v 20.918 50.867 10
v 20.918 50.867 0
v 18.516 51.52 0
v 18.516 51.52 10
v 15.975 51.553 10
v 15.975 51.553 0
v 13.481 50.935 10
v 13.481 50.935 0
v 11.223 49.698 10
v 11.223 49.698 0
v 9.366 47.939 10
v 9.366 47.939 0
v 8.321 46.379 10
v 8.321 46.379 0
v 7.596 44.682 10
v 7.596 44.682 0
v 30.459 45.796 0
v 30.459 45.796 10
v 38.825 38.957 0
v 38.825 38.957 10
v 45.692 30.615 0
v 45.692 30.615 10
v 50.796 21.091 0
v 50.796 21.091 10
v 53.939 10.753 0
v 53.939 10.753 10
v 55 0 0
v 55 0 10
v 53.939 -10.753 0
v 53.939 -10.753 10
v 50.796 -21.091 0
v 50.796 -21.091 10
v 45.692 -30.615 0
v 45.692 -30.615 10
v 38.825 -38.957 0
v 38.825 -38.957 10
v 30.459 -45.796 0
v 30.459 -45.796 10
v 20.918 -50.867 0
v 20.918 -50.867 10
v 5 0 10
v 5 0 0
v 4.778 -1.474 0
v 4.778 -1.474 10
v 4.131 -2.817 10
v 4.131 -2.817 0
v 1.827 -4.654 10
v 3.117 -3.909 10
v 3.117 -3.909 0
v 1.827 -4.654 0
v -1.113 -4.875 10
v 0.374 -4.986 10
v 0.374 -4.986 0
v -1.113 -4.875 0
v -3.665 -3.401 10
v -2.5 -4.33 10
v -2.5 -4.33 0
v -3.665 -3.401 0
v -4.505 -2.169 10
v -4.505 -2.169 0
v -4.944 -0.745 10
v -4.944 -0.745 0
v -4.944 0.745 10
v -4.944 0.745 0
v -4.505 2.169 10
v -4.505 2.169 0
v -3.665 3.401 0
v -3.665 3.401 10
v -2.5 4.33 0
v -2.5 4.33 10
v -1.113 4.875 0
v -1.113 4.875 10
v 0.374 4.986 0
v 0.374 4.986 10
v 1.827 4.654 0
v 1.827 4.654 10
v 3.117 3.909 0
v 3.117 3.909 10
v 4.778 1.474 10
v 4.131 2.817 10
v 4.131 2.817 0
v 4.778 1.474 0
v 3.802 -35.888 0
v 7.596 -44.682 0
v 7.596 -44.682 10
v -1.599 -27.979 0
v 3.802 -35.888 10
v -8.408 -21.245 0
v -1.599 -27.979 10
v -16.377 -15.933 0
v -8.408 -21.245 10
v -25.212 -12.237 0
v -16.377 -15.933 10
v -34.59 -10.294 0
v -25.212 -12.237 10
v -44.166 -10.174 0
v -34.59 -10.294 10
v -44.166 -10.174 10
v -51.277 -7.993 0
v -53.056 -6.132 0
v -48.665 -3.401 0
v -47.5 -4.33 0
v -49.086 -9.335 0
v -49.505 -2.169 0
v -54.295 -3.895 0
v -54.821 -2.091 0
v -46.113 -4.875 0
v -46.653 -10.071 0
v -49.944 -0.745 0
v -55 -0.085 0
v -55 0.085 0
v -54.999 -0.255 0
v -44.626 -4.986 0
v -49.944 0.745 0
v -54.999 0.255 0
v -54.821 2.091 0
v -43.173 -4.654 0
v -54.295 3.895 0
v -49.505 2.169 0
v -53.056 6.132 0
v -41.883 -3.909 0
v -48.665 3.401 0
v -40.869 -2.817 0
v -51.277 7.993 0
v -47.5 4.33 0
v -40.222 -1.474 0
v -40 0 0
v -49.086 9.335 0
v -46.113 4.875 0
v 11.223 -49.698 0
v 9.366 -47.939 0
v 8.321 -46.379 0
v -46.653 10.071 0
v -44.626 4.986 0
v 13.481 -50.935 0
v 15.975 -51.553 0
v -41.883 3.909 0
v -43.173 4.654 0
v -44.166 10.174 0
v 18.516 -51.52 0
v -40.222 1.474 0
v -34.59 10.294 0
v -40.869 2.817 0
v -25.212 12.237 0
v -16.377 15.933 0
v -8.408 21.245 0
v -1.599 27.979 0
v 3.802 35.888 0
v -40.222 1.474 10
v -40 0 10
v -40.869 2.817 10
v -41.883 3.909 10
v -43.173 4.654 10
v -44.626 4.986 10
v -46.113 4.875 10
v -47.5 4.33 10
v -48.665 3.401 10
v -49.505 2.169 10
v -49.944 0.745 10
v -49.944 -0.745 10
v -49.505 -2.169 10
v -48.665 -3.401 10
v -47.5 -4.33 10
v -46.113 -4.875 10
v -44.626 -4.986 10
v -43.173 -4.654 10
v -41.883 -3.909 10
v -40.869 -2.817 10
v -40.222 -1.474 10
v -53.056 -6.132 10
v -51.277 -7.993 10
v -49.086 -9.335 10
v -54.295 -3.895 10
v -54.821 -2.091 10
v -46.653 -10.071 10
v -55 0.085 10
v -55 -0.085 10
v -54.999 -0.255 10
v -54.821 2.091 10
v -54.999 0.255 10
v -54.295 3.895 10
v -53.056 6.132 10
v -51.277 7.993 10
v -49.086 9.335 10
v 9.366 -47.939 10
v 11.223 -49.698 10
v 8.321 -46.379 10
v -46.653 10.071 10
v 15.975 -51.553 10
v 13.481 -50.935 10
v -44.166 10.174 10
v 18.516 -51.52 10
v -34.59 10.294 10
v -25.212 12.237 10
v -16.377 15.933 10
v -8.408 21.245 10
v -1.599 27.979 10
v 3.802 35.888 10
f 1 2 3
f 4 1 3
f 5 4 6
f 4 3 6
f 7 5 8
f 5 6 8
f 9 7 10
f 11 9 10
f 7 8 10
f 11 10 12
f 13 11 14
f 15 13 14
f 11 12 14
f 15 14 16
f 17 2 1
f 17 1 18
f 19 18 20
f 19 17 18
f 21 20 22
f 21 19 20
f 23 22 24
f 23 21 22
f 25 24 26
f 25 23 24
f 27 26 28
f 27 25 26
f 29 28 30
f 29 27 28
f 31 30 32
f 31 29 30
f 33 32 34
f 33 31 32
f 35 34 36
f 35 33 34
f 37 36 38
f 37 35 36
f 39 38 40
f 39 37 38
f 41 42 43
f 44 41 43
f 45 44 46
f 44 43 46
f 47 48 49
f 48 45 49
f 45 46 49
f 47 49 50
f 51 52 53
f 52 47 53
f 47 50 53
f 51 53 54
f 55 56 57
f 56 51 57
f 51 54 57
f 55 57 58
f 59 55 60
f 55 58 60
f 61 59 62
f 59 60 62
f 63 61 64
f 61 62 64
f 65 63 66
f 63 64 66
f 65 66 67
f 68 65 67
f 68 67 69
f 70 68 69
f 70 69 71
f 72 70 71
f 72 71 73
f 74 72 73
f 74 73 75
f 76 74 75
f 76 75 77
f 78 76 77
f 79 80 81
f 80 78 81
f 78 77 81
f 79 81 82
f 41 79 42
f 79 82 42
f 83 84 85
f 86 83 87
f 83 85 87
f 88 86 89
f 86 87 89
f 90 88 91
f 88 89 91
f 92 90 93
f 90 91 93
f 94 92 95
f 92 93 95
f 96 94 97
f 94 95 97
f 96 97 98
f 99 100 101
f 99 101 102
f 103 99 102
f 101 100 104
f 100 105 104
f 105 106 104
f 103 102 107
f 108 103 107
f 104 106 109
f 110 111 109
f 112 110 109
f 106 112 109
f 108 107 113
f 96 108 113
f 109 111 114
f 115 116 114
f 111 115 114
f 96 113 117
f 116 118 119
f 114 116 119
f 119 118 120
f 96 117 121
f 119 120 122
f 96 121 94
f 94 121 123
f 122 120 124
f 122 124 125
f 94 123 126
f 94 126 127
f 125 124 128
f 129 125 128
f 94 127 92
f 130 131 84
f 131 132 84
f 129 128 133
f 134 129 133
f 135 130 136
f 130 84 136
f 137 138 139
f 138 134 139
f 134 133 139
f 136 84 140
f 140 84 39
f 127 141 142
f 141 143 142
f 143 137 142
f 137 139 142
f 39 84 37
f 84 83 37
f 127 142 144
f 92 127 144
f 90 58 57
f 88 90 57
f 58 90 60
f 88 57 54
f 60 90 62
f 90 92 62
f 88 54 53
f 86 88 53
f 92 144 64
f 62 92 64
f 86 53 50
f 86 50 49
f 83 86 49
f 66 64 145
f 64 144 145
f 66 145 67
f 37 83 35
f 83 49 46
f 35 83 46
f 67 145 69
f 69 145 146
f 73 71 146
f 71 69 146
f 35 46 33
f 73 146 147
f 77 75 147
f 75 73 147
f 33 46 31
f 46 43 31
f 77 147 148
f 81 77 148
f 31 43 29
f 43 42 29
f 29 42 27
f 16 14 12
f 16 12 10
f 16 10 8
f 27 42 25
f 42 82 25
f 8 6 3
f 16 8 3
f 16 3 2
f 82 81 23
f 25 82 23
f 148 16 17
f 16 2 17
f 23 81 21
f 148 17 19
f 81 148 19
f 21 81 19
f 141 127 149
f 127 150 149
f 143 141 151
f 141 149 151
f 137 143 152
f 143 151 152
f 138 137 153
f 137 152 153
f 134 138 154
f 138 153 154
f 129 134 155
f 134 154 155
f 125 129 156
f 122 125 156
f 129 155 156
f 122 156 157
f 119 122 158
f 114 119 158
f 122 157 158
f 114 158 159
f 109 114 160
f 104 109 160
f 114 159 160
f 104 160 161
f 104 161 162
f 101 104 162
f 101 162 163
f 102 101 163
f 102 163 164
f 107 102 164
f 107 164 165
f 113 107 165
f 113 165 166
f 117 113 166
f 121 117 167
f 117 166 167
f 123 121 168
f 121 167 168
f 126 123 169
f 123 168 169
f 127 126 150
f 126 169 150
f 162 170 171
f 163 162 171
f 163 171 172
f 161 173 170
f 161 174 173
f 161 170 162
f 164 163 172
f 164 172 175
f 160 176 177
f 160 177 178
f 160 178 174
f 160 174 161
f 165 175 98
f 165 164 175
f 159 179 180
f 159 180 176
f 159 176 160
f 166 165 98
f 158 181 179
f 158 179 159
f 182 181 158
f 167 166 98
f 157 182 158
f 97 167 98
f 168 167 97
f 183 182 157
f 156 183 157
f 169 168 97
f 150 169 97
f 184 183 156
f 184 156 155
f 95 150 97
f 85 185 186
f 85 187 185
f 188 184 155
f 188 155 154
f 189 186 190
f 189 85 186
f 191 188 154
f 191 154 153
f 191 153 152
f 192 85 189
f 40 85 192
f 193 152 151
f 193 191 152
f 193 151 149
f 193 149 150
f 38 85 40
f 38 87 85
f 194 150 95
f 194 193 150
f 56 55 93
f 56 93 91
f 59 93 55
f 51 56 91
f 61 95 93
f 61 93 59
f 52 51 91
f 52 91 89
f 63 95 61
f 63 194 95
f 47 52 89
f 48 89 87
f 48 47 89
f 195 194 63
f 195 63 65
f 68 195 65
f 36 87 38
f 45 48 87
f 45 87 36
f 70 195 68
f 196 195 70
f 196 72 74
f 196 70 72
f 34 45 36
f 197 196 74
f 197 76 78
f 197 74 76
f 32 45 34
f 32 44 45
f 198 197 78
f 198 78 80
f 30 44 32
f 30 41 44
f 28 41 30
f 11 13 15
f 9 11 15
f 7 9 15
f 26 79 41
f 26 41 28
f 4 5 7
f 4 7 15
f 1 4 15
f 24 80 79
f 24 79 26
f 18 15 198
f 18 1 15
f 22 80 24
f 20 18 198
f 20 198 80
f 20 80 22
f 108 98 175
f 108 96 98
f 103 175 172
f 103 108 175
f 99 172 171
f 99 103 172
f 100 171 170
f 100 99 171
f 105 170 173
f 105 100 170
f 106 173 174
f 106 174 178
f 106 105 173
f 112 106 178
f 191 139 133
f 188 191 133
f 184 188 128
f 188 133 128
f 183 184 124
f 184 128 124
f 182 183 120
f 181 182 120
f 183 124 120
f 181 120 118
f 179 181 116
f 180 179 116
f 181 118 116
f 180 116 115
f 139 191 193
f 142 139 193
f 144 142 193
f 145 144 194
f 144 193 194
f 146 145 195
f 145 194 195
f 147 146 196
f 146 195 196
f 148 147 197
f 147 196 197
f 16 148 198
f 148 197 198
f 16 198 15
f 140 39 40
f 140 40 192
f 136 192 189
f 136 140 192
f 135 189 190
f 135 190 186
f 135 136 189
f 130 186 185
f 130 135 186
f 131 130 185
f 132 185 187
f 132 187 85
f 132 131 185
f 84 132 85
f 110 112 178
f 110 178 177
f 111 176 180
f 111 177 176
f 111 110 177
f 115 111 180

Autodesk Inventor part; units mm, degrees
ref_plane "YZ Plane" through (0, 0, 0) normal (1, 0, 0) x (0, 1, 0)
ref_plane "XZ Plane" through (0, 0, 0) normal (0, 1, 0) x (-1, 0, 0)
ref_plane "XY Plane" through (0, 0, 0) normal (0, 0, 1) x (1, 0, 0)
sketch "Эскиз1" plane through (0, 0, 0) normal (0, 0, 1) x (1, 0, 0)
  circle A0 centre (0, 0) radius 5
  circle A1 centre (0, 0) radius 55
  dimension "d0" = 10
  dimension "d1" = 110
extrude "Выдавливание1" add sketch "Эскиз1" along normal blind 10
sketch "Эскиз2" plane through (0, 0, 10) normal (0, 0, 1) x (1, 0, 0)
  circle A0 centre (-40, 60) radius 50
  line L0 (0, -92.4934) -> (0, 92.4934) projected
  line L1 (-90.2801, 0) -> (79.2133, 0) projected
  circle A1 centre (-40, -60) radius 50
  point P0 (0, 0)
  dimension "d4" = 60
  dimension "d5" = 40
  dimension "d14" = 100
extrude "Выдавливание2" cut sketch "Эскиз2" against normal through all
fillet "Сопряжение1" radius 10 4 edges at (9.6561, 54.1457, 5) (-53.6946, 11.912, 5) (9.6561, -54.1457, 5) (-53.6946, -11.912, 5)
fillet_without_effect "Сопряжение2"
sketch "Эскиз3" plane through (0, 0, 10) normal (0, 0, 1) x (1, 0, 0)
  circle A0 centre (0, 0) radius 5 projected
  line L0 (-77, 0) -> (77, 0) projected
  circle A1 centre (-45, 0) radius 5
  dimension "d10" = 10
  dimension "d11" = 45
extrude "Выдавливание3" cut sketch "Эскиз3" against normal through all contours A1 L0 | L0 A1
properties part number "кривошип_v3"
